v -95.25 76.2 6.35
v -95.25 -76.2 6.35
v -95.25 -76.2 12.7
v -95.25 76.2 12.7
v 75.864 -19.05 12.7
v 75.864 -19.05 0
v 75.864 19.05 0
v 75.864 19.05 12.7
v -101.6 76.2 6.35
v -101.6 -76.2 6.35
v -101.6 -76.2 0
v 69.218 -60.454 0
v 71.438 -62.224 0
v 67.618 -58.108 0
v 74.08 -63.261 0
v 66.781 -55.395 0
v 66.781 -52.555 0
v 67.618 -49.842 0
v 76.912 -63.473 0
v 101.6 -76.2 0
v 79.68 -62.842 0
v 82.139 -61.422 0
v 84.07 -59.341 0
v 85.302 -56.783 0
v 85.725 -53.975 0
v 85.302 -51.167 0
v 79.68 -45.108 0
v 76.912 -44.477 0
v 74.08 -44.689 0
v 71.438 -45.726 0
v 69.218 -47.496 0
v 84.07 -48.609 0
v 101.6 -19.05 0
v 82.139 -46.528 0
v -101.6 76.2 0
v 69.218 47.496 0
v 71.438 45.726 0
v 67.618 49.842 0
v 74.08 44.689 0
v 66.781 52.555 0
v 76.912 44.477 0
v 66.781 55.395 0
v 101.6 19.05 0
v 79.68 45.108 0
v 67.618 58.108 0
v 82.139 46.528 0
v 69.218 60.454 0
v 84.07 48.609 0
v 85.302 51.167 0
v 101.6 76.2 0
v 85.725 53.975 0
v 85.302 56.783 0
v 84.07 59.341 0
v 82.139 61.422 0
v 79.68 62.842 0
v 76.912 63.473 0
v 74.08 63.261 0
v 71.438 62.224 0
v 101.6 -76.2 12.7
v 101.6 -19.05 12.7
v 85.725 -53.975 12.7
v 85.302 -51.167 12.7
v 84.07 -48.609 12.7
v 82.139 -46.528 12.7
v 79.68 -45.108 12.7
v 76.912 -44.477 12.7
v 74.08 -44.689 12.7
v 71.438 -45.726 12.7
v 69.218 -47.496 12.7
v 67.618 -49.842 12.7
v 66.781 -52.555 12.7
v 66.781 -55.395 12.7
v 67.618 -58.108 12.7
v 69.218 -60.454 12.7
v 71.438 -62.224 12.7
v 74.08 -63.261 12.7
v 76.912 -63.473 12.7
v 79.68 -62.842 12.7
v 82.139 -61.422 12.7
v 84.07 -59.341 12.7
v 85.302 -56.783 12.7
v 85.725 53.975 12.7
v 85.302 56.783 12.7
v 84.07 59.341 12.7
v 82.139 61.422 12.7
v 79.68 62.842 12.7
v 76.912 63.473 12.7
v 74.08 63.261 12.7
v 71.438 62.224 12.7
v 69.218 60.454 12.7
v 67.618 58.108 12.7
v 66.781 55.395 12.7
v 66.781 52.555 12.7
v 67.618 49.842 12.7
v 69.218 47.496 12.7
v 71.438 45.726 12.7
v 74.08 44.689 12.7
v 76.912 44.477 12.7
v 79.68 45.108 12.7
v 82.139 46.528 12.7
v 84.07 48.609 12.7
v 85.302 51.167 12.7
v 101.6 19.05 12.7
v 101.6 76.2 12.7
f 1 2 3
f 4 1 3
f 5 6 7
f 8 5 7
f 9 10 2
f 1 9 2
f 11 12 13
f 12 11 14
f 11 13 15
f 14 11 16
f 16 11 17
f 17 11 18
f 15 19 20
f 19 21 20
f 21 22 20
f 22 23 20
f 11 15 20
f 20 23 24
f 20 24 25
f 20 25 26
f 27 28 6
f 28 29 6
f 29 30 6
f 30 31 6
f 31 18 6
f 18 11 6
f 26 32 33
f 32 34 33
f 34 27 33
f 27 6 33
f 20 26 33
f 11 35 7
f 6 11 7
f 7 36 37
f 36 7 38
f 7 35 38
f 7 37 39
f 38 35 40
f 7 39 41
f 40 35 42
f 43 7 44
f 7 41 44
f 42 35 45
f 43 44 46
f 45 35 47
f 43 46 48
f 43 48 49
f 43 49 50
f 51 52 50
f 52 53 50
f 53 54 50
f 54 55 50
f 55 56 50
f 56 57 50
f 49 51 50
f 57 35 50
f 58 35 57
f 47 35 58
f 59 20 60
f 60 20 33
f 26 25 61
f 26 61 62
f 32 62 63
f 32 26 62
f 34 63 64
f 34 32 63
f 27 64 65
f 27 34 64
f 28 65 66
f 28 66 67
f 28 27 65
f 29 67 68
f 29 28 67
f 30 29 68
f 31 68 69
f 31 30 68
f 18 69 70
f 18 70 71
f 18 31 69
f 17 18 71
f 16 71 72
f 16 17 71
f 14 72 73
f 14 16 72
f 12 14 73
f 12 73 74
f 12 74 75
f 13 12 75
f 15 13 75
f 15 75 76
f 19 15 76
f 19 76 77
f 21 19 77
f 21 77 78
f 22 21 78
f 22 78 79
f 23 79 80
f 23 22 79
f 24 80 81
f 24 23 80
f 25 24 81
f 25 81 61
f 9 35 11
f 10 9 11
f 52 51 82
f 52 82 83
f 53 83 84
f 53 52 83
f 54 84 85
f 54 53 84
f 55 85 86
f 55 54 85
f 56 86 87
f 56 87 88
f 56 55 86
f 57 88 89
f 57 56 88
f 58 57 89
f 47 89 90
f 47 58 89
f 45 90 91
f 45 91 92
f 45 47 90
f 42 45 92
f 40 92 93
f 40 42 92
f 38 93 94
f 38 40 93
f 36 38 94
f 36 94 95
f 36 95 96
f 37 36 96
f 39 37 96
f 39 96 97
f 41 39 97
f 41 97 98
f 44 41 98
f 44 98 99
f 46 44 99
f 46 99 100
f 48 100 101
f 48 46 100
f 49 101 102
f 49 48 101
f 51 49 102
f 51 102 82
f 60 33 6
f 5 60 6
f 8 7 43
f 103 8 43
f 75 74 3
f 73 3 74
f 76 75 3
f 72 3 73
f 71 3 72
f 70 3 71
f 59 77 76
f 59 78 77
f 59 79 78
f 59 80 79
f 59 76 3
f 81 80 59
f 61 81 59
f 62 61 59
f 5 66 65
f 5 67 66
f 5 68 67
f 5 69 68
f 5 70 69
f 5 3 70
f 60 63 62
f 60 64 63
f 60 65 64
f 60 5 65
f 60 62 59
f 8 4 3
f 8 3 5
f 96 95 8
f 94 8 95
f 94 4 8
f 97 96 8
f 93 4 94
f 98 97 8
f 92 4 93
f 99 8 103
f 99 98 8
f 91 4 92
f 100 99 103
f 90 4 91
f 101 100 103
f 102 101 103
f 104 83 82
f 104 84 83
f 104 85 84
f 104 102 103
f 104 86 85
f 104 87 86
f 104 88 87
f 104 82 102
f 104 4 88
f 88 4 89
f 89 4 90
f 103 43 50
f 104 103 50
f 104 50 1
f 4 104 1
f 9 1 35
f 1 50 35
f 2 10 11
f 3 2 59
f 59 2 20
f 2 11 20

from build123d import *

# Parameters (mm, degrees)
F0_R     = 9.525
F1_DEPTH = 12.7
F2_W     = 6.35
F2_H     = 6.35
F3_DEPTH = 152.401


with BuildPart() as f1:
    # F0 (on Top) → F1 (new body)
    with BuildSketch(Plane.XY):
        Polygon((101.6, 76.2), (-101.6, 76.2), (-101.6, -76.2), (101.6, -76.2), (101.6, -19.05), (75.863957, -19.05), (75.863957, 19.05), (101.6, 19.05), align=None)
        with Locations((76.2, -53.975)):
            Circle(F0_R, mode=Mode.SUBTRACT)
        with Locations((76.2, 53.975)):
            Circle(F0_R, mode=Mode.SUBTRACT)
    extrude(amount=F1_DEPTH)

    # F2 (on face) → F3 (cut, through all)
    with BuildSketch(Plane.XZ.offset(76.2)):
        with Locations((-98.425, 9.525)):
            Rectangle(F2_W, F2_H)
    extrude(amount=-F3_DEPTH, mode=Mode.SUBTRACT)


solid = f1.part
